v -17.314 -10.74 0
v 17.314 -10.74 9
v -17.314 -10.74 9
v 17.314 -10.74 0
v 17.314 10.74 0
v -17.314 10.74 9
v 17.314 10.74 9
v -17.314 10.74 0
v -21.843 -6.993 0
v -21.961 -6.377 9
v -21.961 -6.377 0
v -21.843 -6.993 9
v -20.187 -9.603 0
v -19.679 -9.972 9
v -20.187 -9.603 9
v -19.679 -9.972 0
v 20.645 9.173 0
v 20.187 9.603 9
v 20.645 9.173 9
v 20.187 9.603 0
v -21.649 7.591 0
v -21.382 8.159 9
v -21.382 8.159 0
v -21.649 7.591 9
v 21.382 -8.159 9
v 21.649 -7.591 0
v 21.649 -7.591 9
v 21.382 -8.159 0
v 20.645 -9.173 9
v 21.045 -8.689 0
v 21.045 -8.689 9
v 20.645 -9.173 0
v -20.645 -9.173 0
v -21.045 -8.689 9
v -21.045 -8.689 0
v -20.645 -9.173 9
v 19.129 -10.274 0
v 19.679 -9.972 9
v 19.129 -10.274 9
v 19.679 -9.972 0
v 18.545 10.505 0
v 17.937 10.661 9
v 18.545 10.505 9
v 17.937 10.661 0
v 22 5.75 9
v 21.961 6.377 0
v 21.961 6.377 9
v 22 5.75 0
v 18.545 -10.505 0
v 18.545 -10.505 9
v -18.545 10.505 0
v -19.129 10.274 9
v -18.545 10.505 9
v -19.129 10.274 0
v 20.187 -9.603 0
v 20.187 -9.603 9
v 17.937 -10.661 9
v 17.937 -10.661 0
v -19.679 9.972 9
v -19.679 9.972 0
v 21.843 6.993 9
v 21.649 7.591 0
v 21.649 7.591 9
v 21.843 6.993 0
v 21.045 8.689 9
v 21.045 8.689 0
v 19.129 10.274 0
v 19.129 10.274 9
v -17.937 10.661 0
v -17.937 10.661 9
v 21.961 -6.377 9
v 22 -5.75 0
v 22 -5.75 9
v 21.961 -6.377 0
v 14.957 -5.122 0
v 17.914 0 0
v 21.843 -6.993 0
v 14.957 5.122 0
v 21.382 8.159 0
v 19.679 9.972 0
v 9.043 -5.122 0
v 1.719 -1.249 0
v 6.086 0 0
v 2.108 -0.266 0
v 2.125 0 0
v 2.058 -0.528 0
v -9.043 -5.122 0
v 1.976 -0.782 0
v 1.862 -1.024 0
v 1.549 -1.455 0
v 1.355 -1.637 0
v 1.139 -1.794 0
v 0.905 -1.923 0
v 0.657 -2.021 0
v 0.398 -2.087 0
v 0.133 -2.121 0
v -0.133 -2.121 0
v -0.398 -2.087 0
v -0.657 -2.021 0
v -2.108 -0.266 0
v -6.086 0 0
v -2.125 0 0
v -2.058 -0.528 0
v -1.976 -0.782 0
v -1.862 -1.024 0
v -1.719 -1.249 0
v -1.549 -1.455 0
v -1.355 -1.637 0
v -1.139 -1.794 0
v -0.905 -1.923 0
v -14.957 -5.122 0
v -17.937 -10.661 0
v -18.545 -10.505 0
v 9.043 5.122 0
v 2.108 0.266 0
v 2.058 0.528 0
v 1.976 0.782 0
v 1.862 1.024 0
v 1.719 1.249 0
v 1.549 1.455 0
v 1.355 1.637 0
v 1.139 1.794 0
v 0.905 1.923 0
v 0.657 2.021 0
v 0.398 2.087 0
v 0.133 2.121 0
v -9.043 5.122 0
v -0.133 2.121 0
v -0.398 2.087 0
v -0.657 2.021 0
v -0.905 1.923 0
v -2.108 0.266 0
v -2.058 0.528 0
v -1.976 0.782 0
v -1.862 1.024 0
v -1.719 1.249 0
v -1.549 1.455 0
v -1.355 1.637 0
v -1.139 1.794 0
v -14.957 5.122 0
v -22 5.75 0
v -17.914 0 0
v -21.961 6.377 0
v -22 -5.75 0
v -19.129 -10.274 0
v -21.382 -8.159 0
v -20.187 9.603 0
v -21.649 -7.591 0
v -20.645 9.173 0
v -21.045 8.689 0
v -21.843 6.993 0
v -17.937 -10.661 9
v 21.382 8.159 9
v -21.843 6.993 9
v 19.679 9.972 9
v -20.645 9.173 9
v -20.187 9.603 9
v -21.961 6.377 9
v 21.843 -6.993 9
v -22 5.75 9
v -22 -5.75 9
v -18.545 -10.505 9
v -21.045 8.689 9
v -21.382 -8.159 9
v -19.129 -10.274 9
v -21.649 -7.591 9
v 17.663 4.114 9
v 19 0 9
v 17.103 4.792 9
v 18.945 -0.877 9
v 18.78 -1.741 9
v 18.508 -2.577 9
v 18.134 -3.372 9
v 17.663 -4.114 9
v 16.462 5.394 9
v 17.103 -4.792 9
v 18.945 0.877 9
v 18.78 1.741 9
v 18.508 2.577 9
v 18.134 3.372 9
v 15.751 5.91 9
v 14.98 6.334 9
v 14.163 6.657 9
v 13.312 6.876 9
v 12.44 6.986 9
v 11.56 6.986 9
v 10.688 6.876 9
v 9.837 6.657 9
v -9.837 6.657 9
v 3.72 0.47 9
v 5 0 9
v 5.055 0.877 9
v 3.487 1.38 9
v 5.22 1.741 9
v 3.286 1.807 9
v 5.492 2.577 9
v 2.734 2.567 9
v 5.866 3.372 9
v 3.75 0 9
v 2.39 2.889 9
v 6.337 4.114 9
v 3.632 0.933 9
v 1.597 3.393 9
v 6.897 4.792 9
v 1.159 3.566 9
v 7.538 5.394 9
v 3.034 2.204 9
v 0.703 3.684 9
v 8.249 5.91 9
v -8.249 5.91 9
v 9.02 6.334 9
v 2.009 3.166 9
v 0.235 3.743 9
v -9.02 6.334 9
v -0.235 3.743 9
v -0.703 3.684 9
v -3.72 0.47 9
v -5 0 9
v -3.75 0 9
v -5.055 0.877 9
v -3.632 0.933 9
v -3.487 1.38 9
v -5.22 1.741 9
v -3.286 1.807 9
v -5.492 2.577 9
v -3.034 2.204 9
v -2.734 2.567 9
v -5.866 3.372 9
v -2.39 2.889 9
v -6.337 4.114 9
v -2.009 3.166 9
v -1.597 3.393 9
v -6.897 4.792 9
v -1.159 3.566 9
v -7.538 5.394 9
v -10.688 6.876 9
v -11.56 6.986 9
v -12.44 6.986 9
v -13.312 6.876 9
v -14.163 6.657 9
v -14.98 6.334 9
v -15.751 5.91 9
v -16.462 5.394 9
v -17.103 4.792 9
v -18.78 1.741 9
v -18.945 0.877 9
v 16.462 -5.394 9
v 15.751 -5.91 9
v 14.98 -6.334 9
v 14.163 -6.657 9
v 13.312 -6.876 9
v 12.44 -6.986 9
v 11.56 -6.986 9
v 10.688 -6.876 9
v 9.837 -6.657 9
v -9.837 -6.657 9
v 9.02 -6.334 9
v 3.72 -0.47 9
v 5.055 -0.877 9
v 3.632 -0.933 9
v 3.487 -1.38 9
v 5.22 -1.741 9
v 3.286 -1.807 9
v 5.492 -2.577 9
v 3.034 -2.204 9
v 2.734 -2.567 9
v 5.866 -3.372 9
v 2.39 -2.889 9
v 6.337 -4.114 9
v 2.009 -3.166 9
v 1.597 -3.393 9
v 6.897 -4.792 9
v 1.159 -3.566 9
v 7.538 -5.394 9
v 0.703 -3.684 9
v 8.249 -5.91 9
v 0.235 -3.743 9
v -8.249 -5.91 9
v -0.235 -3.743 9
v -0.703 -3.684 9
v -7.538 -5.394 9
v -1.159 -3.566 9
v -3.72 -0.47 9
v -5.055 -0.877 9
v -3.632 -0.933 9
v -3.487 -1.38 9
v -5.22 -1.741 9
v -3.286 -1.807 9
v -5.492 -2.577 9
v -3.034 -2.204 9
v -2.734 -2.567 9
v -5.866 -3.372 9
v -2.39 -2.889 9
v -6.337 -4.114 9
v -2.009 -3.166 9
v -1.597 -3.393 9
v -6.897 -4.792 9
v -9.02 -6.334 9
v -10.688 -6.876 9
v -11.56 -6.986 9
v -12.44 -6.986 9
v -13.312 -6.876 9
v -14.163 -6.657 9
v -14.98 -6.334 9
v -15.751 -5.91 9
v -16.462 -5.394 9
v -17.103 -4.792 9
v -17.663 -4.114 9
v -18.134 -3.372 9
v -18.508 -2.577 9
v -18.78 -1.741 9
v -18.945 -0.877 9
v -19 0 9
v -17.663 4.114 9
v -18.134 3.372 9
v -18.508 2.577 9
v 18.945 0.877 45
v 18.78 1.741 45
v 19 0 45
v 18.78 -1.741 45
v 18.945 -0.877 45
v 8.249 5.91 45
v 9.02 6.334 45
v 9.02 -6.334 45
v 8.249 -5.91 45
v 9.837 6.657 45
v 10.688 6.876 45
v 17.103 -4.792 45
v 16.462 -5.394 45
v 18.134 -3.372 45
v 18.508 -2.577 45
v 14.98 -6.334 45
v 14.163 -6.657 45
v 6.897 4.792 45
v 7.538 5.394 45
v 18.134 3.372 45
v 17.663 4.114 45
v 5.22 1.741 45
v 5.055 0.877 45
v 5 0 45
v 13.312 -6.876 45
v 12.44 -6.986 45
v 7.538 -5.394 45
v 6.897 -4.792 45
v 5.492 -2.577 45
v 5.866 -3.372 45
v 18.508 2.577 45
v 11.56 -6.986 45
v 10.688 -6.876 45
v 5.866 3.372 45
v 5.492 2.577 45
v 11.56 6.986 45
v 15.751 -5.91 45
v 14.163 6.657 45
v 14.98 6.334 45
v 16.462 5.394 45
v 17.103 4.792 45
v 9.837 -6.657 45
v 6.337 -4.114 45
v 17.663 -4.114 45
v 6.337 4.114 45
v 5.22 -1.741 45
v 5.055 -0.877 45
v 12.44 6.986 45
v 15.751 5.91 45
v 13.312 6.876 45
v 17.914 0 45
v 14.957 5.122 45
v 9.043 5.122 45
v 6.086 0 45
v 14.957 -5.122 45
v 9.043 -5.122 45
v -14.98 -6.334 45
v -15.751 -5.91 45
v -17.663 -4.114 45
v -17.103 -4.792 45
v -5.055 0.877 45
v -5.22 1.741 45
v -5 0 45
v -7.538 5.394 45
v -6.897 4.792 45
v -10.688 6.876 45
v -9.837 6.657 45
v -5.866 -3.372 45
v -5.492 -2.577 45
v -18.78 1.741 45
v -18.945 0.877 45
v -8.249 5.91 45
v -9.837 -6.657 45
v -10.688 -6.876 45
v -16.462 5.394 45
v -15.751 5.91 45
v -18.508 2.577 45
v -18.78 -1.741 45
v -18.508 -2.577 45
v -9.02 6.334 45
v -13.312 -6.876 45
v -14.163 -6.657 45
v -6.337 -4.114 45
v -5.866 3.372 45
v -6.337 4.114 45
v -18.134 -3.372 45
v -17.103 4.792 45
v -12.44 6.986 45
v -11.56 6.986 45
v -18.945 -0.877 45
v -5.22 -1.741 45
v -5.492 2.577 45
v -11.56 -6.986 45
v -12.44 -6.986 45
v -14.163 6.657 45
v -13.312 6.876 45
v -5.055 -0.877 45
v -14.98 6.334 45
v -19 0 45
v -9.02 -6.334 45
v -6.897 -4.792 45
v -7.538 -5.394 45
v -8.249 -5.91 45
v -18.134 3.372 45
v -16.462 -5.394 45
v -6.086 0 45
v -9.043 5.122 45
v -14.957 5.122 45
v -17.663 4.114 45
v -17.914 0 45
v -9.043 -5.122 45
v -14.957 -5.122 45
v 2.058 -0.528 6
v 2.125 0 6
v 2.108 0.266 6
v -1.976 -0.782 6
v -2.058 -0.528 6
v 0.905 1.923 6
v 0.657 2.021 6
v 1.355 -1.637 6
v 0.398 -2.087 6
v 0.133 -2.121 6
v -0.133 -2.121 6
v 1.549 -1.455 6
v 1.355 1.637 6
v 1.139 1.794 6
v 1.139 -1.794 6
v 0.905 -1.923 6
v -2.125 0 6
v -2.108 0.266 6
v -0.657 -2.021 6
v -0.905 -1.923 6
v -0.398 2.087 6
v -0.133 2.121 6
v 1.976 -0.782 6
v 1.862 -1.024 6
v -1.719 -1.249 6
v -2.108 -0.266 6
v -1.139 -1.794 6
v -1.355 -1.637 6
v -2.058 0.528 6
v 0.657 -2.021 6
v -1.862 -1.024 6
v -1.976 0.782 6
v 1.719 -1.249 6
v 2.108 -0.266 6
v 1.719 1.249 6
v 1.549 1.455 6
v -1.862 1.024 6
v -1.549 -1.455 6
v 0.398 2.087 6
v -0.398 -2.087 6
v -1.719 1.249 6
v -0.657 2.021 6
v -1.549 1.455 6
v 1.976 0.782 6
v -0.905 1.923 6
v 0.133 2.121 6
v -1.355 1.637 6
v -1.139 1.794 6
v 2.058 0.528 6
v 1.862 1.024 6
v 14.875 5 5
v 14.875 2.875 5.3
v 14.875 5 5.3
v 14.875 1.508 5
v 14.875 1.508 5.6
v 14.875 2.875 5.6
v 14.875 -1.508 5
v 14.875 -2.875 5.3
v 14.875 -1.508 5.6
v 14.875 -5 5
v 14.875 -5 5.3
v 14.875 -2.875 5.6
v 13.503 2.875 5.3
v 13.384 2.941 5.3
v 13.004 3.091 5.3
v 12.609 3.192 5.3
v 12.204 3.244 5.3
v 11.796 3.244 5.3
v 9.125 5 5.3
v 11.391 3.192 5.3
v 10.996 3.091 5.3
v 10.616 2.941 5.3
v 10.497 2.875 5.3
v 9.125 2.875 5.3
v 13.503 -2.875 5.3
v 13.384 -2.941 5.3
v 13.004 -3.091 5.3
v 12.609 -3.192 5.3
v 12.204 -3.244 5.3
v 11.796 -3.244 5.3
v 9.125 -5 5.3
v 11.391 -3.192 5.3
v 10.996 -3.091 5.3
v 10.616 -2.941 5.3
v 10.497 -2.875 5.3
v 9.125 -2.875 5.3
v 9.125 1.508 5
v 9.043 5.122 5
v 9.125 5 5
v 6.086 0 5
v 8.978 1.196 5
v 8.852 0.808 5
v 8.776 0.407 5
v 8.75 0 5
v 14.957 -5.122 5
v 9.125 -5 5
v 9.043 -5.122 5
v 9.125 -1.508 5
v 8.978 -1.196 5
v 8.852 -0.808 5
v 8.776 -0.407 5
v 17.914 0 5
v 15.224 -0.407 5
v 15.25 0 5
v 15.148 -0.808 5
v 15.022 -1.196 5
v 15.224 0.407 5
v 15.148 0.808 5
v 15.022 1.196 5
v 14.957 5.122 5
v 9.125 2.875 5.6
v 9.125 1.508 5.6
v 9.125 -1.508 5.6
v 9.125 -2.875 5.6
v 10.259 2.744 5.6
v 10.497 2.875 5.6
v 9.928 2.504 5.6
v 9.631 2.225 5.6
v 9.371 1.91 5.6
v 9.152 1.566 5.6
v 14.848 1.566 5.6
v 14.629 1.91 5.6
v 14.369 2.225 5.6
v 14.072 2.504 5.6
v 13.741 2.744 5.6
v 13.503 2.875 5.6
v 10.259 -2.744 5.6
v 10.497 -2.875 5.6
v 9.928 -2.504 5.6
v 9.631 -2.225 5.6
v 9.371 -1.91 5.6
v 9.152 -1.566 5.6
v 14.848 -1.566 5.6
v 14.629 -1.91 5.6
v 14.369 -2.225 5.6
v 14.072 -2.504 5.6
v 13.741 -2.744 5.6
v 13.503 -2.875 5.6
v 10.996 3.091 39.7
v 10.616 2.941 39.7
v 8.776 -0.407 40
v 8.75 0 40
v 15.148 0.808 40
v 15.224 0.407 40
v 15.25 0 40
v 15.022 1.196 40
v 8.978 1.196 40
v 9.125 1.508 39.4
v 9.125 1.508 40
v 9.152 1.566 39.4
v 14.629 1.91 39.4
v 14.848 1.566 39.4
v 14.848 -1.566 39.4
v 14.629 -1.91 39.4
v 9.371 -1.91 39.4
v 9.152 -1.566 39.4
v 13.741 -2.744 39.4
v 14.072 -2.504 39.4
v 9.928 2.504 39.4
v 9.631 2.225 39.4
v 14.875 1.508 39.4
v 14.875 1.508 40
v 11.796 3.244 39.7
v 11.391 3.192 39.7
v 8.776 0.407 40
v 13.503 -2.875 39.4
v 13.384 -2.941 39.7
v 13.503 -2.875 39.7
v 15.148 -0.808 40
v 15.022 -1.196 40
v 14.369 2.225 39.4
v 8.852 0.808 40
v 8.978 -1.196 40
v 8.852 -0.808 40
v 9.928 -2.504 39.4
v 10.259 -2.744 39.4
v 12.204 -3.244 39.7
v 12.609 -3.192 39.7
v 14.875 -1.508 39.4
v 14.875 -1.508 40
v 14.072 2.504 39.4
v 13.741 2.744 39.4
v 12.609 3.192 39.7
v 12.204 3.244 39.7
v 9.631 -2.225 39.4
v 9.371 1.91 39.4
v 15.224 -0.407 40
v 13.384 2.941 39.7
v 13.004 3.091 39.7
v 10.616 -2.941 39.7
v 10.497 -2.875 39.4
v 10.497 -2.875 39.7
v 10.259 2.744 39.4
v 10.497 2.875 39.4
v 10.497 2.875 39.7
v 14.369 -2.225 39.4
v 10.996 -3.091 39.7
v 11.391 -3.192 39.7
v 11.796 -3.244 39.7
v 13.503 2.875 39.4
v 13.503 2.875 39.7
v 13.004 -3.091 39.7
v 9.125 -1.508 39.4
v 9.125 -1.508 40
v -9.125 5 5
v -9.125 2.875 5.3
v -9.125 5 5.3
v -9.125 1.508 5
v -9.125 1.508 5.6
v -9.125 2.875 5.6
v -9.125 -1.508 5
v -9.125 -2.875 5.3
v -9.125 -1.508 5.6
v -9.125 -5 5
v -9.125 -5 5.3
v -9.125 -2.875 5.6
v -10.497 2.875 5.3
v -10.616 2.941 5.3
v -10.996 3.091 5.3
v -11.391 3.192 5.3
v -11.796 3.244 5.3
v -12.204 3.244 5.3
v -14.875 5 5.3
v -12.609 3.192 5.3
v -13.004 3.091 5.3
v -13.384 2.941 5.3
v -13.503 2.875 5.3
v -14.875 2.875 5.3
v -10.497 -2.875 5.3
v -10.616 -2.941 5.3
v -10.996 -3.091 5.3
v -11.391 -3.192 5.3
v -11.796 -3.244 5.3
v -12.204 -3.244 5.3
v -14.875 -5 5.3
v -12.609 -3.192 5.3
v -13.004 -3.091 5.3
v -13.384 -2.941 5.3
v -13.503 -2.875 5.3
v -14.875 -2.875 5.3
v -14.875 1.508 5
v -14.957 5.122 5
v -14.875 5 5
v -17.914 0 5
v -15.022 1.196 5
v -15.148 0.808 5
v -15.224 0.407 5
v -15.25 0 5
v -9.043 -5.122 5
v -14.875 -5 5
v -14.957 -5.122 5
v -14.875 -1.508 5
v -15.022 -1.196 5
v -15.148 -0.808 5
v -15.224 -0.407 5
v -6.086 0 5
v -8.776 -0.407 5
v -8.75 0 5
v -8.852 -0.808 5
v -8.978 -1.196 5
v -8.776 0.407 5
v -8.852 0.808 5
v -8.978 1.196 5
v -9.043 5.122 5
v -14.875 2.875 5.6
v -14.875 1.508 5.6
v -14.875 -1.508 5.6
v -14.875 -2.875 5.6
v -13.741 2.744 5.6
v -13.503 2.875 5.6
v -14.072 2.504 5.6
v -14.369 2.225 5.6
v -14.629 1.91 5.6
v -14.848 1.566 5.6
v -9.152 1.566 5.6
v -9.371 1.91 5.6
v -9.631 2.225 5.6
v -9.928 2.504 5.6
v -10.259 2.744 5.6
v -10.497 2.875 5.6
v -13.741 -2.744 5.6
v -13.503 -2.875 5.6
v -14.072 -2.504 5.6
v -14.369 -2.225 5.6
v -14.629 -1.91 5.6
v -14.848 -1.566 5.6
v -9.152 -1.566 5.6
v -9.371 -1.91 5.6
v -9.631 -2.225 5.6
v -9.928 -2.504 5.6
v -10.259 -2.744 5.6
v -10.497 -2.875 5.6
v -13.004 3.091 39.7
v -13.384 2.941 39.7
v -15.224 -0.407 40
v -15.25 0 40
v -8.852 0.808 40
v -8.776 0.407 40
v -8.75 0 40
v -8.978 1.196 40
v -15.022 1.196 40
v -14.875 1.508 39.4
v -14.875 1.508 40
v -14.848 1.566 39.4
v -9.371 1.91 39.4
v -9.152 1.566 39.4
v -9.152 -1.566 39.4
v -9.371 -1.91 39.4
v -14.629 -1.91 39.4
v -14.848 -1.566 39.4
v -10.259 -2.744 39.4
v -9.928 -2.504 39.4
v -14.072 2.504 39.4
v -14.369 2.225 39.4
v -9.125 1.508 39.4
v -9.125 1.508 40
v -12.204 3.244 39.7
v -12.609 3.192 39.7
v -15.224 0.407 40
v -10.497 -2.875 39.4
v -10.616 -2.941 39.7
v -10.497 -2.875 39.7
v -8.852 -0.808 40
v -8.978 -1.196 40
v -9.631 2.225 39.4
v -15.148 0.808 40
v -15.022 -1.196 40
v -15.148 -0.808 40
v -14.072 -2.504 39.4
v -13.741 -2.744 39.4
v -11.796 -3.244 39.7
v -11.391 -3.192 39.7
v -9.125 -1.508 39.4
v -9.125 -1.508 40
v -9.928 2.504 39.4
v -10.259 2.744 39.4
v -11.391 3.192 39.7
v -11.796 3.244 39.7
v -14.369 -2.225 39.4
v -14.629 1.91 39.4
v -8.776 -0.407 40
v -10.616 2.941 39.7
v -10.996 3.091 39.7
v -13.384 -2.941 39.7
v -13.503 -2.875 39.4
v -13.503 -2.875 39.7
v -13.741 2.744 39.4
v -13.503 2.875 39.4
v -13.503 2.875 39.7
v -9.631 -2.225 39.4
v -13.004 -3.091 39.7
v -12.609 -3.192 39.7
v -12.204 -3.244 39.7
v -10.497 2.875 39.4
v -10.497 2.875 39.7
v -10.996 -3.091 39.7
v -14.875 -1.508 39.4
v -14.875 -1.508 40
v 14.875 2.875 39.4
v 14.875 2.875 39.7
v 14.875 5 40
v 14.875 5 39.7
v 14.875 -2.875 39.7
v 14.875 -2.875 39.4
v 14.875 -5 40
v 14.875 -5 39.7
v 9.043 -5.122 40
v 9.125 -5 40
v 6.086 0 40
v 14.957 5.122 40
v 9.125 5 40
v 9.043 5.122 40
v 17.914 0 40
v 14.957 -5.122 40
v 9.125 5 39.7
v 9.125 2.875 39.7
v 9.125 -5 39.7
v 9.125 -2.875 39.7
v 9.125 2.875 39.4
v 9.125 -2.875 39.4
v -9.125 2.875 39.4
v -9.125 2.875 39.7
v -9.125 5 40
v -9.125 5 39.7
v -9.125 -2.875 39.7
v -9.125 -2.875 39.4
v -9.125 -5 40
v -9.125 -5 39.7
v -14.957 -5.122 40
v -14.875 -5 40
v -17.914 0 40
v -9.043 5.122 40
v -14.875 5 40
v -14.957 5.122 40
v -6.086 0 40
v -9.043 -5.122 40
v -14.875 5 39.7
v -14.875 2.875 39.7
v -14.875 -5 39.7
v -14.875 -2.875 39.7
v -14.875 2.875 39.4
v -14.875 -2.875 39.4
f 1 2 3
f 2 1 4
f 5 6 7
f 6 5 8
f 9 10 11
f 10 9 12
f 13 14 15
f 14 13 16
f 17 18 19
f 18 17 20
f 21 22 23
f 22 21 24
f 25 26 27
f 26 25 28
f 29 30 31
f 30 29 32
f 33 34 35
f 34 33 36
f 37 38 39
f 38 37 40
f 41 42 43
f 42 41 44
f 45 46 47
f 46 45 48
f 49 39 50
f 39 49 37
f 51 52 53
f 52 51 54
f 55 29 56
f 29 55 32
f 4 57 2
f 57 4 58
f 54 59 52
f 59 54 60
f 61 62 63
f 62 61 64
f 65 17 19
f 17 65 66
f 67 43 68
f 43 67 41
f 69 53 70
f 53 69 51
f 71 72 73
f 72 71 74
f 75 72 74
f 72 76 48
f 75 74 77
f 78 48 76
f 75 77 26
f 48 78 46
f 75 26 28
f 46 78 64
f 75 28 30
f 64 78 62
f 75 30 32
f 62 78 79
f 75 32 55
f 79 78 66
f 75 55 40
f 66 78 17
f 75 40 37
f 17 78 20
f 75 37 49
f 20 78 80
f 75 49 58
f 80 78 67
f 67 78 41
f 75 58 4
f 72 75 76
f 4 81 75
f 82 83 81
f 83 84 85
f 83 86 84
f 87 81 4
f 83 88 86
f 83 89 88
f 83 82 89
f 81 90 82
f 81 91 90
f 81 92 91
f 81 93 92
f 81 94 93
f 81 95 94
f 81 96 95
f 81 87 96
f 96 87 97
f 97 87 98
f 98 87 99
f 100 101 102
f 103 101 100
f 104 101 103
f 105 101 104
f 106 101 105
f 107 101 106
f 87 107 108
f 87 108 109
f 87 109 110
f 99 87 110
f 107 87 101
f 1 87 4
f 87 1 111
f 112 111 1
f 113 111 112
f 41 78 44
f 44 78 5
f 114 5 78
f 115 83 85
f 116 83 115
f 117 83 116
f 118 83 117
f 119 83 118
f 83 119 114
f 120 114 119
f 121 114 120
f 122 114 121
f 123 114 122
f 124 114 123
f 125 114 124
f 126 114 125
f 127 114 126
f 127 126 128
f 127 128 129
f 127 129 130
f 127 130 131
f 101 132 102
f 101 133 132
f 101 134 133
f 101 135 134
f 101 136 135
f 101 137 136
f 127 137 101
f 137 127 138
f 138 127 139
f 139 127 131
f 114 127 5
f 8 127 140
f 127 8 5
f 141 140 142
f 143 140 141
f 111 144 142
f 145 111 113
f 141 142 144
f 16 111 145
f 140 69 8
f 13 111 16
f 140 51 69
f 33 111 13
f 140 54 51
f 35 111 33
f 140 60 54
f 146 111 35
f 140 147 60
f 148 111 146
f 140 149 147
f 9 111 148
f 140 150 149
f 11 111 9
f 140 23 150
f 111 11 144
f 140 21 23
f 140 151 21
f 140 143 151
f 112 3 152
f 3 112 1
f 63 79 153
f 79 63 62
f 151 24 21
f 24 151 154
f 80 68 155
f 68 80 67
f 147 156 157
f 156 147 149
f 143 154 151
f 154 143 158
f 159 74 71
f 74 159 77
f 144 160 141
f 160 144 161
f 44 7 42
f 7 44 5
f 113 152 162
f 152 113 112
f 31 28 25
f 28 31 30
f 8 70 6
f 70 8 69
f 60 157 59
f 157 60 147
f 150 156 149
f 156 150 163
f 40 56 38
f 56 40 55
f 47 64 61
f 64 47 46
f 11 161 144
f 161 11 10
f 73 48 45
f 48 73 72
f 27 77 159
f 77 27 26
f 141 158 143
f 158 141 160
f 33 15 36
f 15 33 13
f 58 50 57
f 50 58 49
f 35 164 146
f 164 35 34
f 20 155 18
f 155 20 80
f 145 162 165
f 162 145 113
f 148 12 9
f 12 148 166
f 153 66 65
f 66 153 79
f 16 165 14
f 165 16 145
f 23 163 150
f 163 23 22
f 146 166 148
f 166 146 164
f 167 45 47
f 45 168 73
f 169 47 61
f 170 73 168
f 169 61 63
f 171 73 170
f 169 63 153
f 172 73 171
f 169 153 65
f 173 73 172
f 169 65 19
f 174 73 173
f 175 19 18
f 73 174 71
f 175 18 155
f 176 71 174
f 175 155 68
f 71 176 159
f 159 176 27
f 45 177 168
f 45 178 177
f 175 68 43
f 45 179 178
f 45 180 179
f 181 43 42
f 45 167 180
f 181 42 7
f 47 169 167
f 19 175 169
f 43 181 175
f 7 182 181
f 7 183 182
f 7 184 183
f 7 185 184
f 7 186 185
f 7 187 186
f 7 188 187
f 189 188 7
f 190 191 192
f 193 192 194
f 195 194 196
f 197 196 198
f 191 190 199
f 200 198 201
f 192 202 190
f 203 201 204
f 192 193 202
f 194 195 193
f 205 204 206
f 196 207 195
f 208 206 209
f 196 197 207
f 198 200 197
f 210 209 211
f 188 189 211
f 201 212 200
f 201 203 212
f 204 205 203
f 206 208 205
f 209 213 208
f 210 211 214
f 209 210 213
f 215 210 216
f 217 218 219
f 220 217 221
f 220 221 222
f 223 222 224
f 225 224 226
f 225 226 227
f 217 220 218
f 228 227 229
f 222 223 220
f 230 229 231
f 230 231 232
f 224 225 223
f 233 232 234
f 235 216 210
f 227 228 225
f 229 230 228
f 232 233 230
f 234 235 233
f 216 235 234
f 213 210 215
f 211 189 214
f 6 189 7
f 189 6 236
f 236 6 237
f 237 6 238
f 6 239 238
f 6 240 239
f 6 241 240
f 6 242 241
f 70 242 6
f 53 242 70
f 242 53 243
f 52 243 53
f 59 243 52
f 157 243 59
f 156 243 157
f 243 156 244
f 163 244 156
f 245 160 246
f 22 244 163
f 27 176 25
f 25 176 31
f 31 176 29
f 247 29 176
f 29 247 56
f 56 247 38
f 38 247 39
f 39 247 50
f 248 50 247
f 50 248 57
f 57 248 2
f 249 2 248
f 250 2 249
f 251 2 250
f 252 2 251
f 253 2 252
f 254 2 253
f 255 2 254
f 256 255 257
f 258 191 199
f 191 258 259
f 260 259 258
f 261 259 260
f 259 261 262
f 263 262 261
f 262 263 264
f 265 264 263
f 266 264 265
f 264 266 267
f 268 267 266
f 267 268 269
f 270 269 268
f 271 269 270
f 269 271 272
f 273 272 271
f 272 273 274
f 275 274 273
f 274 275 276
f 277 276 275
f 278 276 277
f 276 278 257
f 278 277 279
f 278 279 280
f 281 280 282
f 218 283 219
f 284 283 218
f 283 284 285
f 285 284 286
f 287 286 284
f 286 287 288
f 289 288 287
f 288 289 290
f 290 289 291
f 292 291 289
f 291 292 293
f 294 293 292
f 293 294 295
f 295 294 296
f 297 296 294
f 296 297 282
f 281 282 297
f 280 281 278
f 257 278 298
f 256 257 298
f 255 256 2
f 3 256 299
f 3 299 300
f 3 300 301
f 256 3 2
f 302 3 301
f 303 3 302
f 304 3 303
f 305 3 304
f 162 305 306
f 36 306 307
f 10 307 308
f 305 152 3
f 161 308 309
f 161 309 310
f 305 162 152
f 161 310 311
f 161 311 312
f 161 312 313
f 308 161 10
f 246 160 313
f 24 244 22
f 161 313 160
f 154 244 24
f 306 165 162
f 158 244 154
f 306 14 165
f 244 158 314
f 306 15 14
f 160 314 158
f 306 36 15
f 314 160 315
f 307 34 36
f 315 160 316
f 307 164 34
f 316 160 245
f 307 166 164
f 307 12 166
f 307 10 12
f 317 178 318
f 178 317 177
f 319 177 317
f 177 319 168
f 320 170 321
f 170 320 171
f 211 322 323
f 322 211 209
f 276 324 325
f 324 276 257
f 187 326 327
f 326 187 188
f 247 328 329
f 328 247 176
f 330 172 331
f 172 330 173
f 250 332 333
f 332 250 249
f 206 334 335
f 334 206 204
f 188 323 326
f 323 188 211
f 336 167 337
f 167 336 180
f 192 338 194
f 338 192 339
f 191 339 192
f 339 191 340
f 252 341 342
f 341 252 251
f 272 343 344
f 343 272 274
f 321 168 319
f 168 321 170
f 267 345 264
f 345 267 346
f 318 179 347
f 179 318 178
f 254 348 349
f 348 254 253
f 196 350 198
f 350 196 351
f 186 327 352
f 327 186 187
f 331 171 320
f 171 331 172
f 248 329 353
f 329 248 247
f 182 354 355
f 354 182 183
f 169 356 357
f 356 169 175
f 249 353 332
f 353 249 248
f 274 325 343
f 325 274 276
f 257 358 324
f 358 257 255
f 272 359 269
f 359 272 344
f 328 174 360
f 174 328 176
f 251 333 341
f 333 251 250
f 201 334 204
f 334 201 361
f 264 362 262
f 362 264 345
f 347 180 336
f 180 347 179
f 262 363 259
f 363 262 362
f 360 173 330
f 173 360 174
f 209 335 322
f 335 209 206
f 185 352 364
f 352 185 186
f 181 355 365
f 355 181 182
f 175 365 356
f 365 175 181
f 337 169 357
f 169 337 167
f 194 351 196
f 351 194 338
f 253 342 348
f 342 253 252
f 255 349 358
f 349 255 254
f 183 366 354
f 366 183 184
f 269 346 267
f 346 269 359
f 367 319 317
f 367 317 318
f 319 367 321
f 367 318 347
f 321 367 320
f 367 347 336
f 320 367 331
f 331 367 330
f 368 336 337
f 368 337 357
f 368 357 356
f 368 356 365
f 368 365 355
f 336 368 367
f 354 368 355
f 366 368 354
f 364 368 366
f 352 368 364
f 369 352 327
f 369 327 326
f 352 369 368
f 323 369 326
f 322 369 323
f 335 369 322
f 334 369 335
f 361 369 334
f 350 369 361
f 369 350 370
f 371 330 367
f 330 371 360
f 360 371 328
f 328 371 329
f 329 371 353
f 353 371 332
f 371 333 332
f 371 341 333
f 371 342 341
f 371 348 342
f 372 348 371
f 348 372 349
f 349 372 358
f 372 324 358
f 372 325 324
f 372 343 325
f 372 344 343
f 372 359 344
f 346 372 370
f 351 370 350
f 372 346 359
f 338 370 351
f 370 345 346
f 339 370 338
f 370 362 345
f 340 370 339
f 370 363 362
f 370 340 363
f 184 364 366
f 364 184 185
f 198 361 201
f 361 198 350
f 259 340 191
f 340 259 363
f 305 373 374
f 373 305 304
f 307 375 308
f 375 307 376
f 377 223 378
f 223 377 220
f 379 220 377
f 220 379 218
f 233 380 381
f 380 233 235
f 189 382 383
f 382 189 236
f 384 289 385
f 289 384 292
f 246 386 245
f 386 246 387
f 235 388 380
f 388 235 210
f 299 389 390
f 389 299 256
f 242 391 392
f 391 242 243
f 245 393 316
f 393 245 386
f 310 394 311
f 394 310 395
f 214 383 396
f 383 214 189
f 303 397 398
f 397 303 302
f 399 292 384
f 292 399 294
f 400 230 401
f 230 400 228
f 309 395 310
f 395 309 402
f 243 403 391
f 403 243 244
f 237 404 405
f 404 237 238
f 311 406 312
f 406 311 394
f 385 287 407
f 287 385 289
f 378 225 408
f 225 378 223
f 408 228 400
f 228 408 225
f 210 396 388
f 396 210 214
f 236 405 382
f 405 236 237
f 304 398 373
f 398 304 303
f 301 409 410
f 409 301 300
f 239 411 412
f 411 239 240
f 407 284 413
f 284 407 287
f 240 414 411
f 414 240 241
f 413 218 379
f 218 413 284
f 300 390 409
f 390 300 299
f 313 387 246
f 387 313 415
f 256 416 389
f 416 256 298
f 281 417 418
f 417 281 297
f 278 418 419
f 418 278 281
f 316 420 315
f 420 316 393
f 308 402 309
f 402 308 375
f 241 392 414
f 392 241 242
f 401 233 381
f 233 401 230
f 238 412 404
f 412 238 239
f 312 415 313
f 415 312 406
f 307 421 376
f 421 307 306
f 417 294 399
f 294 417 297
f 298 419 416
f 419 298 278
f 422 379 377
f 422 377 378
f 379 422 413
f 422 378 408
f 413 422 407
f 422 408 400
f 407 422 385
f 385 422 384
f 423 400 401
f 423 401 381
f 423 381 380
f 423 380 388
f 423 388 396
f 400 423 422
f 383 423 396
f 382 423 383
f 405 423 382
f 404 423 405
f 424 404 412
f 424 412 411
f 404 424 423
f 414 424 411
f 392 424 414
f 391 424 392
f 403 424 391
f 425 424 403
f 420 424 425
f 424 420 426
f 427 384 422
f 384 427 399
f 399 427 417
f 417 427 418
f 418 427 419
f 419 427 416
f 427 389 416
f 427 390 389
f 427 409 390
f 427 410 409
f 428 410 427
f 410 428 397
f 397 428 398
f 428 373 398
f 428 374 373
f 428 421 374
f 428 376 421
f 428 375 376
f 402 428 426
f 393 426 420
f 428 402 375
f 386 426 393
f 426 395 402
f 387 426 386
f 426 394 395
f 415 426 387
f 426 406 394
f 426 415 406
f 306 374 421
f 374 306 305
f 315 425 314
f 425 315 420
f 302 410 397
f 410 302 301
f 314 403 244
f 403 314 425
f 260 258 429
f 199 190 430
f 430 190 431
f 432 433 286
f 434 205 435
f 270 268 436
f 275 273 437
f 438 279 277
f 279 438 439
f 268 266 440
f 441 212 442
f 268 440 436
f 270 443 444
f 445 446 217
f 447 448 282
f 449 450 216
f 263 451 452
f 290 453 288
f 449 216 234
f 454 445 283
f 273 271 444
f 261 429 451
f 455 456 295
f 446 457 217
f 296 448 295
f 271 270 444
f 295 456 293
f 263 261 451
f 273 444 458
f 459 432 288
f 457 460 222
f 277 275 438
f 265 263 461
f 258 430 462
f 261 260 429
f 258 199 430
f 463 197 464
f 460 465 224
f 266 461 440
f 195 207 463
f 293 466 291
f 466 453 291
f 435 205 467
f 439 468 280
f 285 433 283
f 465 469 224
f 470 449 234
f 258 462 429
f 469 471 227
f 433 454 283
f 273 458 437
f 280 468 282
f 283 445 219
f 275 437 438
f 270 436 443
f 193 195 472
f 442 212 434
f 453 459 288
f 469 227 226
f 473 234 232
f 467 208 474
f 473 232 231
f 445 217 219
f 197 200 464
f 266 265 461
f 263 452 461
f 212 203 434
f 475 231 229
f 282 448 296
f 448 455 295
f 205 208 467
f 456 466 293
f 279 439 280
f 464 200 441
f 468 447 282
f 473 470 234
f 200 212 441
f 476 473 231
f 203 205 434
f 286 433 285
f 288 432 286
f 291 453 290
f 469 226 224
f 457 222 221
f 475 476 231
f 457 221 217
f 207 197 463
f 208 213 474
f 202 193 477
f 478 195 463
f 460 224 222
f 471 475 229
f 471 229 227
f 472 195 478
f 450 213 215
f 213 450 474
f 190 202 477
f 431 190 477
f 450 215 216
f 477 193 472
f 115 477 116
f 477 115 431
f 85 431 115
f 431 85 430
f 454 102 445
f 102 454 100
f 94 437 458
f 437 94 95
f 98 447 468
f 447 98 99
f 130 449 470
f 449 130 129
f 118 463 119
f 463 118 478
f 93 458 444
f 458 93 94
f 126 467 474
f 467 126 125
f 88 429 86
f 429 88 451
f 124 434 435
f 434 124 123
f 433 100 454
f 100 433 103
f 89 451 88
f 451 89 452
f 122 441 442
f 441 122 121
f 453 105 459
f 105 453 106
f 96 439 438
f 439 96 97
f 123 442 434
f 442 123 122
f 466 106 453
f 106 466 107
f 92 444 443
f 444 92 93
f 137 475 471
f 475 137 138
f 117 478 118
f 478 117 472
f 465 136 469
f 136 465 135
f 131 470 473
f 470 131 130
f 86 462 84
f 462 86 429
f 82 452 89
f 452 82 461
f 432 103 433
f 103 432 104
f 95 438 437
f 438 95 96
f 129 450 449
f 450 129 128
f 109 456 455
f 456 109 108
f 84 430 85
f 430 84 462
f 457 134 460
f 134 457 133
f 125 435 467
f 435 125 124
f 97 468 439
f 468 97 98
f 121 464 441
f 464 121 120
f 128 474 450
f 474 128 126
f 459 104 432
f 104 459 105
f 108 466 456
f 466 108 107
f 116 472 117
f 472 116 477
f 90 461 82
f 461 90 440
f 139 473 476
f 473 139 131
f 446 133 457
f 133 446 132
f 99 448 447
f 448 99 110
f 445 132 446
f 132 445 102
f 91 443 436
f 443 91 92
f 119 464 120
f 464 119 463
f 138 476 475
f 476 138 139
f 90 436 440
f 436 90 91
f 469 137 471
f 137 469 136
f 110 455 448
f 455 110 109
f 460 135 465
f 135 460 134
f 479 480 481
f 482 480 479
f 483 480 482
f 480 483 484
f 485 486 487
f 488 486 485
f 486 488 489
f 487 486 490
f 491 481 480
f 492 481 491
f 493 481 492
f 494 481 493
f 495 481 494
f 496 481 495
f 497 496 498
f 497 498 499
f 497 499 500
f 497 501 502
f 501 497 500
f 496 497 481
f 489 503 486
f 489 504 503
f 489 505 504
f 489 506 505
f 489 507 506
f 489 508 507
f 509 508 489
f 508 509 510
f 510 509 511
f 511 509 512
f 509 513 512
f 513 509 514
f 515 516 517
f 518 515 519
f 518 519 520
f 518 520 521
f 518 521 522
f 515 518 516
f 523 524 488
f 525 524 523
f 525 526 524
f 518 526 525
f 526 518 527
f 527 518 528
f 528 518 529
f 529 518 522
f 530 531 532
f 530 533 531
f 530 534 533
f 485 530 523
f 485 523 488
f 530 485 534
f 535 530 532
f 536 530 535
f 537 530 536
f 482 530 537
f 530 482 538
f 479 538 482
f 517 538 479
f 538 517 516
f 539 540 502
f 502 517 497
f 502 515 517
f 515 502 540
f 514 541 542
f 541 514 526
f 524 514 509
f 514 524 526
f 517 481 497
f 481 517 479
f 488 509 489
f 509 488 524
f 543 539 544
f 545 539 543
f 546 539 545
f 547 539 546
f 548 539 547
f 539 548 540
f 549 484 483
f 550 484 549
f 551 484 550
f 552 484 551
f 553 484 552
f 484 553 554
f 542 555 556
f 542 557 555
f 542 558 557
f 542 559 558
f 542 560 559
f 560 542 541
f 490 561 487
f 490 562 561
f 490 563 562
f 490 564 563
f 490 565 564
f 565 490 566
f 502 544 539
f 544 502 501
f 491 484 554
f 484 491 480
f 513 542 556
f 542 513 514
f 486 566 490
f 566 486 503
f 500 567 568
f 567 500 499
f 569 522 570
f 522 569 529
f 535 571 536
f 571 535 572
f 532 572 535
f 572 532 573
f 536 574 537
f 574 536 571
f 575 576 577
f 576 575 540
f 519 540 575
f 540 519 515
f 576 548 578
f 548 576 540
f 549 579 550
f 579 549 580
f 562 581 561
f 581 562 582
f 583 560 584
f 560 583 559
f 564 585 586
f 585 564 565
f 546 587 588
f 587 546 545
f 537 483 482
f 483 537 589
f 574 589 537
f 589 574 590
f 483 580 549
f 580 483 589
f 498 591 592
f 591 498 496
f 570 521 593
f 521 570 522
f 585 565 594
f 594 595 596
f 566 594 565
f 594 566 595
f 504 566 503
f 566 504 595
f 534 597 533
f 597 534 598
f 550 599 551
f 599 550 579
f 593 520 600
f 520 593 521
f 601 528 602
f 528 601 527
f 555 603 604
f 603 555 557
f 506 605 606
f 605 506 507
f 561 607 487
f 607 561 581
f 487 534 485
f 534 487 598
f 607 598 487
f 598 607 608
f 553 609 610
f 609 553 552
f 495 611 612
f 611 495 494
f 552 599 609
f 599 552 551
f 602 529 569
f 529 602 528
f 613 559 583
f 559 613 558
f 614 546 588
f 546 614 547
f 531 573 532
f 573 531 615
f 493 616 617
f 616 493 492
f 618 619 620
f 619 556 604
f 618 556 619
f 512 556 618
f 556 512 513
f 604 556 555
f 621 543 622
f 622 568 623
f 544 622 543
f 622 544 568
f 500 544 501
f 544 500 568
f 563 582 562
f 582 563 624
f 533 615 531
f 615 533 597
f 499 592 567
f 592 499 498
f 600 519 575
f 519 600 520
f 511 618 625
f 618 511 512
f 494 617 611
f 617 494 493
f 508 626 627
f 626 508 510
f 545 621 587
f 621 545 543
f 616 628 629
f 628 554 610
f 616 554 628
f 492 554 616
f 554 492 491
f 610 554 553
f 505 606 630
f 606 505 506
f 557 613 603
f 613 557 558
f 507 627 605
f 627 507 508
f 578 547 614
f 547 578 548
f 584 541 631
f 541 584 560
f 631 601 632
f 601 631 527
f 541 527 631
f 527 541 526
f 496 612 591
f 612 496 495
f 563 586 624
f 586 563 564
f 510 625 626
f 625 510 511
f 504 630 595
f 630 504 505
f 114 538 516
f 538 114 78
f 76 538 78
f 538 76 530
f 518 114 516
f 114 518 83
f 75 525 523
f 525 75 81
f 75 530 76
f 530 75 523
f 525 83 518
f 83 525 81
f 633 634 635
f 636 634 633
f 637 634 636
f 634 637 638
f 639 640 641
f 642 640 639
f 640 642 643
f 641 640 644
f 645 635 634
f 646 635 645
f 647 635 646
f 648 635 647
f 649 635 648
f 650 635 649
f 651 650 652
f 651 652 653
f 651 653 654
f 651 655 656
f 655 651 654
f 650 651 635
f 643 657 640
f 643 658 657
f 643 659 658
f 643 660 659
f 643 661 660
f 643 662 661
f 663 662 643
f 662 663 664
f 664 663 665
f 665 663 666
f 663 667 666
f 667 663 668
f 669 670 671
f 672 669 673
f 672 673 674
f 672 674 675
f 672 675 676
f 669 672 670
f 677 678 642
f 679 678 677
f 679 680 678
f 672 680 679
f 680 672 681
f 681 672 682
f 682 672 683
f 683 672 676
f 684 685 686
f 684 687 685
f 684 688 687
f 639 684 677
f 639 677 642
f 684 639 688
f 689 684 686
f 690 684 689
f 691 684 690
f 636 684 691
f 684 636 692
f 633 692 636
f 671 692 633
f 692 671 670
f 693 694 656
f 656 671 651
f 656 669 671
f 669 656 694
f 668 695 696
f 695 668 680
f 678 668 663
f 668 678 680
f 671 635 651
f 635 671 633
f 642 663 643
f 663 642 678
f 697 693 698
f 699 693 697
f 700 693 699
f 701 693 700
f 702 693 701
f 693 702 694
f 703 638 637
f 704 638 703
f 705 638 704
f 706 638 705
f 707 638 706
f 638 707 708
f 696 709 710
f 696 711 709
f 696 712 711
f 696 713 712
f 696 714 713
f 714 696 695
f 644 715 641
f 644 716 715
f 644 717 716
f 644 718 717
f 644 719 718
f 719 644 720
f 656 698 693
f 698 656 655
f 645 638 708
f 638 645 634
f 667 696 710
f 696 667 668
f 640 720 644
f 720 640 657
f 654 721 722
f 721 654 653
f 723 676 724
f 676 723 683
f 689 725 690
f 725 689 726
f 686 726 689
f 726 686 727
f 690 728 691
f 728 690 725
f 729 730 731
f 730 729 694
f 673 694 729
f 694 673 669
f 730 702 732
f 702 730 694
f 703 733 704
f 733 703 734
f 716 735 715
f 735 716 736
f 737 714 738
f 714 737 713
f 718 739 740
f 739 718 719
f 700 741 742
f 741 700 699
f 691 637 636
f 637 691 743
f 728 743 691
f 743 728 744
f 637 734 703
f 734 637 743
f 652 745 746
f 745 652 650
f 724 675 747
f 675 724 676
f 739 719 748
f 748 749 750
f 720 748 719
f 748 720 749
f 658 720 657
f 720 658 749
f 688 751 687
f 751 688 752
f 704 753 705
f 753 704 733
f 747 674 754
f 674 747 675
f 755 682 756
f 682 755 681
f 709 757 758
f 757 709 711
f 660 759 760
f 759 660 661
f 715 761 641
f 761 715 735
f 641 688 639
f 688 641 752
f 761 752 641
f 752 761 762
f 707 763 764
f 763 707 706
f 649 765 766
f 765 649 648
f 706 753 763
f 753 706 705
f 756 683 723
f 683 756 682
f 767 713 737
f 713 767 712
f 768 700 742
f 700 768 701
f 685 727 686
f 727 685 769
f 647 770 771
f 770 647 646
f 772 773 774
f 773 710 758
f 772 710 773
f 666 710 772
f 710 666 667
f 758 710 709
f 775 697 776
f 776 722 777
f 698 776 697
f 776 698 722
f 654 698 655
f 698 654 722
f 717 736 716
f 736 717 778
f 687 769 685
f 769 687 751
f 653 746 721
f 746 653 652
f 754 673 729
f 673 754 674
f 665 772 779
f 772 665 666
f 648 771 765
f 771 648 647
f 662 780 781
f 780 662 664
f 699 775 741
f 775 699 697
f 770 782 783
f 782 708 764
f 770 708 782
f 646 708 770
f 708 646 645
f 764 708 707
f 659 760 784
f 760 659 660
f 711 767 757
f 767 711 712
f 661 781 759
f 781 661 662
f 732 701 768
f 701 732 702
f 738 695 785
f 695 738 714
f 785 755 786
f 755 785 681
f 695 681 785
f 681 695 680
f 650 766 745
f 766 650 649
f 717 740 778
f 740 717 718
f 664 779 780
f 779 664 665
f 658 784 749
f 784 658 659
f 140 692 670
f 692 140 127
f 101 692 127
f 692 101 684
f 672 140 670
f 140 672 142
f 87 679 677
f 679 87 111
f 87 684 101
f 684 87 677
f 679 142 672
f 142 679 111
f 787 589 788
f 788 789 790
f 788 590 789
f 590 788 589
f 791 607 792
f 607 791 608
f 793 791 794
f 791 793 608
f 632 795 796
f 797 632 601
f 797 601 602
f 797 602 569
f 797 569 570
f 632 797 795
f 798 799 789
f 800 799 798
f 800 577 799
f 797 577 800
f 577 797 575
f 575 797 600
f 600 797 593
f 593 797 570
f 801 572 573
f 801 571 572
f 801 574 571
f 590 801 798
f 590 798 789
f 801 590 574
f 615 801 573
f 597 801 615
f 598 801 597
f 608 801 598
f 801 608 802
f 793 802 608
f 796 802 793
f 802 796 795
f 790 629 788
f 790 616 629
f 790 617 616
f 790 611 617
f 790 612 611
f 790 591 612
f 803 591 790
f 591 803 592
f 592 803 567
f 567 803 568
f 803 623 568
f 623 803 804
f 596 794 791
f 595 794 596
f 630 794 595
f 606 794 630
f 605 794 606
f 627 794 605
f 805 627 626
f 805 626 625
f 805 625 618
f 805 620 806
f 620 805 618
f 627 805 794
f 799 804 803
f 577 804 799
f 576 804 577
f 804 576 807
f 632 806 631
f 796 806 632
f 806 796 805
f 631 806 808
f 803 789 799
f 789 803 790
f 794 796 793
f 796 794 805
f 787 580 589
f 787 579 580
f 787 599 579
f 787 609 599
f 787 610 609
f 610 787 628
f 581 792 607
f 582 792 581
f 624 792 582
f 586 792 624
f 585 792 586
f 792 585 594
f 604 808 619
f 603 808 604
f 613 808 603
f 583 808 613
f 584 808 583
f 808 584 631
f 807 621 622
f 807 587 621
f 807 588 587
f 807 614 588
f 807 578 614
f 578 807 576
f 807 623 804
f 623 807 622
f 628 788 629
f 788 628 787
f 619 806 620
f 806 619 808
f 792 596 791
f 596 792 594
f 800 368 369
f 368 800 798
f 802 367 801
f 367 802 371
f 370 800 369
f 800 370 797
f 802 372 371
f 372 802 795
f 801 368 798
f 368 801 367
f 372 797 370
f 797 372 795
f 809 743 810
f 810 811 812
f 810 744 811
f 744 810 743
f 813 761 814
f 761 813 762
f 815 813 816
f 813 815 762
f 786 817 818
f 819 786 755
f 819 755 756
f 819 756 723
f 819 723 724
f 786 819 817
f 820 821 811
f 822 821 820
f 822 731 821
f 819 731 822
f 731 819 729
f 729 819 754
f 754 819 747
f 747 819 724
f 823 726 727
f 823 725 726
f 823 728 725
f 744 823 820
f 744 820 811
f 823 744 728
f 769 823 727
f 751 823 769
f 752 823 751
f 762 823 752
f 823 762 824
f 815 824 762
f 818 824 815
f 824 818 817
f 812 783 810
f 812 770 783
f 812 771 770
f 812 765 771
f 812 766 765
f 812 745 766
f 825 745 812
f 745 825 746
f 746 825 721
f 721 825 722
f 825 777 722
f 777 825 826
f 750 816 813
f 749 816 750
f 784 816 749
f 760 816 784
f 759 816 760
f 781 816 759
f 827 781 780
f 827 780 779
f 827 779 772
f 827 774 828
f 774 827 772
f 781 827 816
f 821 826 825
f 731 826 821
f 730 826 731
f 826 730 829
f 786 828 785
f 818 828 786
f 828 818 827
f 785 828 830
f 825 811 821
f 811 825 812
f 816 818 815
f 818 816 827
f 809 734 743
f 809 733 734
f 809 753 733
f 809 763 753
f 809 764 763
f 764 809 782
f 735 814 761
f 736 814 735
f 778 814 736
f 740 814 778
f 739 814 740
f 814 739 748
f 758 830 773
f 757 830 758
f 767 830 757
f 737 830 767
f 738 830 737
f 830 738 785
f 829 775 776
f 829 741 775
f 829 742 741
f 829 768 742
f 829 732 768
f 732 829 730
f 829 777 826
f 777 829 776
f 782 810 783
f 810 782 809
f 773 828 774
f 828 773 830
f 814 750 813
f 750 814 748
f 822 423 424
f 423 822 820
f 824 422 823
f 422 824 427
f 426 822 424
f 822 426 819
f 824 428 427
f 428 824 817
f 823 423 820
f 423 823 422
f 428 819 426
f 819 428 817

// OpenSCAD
$fn = 50;


difference() {
	union() {
		hull() {
			translate(v = [-17.0000000000, 5.7500000000, 0]) {
				cylinder(h = 9, r = 5);
			}
			translate(v = [17.0000000000, 5.7500000000, 0]) {
				cylinder(h = 9, r = 5);
			}
			translate(v = [-17.0000000000, -5.7500000000, 0]) {
				cylinder(h = 9, r = 5);
			}
			translate(v = [17.0000000000, -5.7500000000, 0]) {
				cylinder(h = 9, r = 5);
			}
		}
		translate(v = [12.0000000000, 0, 0.0000000000]) {
			cylinder(h = 45, r = 7.0000000000);
		}
		translate(v = [-12.0000000000, 0, 0.0000000000]) {
			cylinder(h = 45, r = 7.0000000000);
		}
	}
	union() {
		translate(v = [0, 0, 9]) {
			rotate(a = [0, 0, 0]) {
				difference() {
					union() {
						#translate(v = [0, 0, -40.0000000000]) {
							cylinder(h = 40, r = 2.0000000000);
						}
						#translate(v = [0, 0, -3]) {
							cylinder(h = 3, r1 = 2.1250000000, r2 = 3.7500000000);
						}
						#translate(v = [0, 0, -40.0000000000]) {
							cylinder(h = 40, r = 2.1250000000);
						}
						#translate(v = [0, 0, -40.0000000000]) {
							cylinder(h = 40, r = 2.0000000000);
						}
					}
					union();
				}
			}
		}
		translate(v = [12.0000000000, 0, 0]) {
			rotate(a = [0, 0, 0]) {
				difference() {
					union() {
						#translate(v = [-2.8750000000, -5.0000000000, -0.3000000000]) {
							cube(size = [5.7500000000, 10, 0.3000000000]);
						}
						#translate(v = [-2.8750000000, -2.8750000000, -0.6000000000]) {
							cube(size = [5.7500000000, 5.7500000000, 0.3000000000]);
						}
						#translate(v = [-2.8750000000, -5.0000000000, 5]) {
							cube(size = [5.7500000000, 10, 0.3000000000]);
						}
						#translate(v = [-2.8750000000, -2.8750000000, 5.3000000000]) {
							cube(size = [5.7500000000, 5.7500000000, 0.3000000000]);
						}
						#translate(v = [0, 0, -100.0000000000]) {
							cylinder(h = 200, r = 3.2500000000);
						}
						#linear_extrude(height = 5) {
							polygon(points = [[5.9142500000, 0.0000000000], [2.9571250000, 5.1218907443], [-2.9571250000, 5.1218907443], [-5.9142500000, 0.0000000000], [-2.9571250000, -5.1218907443], [2.9571250000, -5.1218907443]]);
						}
						#translate(v = [-2.8750000000, -5.0000000000, -0.3000000000]) {
							cube(size = [5.7500000000, 10, 0.3000000000]);
						}
						#translate(v = [-2.8750000000, -2.8750000000, -0.6000000000]) {
							cube(size = [5.7500000000, 5.7500000000, 0.3000000000]);
						}
						#translate(v = [-2.8750000000, -5.0000000000, 5]) {
							cube(size = [5.7500000000, 10, 0.3000000000]);
						}
						#translate(v = [-2.8750000000, -2.8750000000, 5.3000000000]) {
							cube(size = [5.7500000000, 5.7500000000, 0.3000000000]);
						}
						#translate(v = [0, 0, -100.0000000000]) {
							cylinder(h = 200, r = 3.2500000000);
						}
						#translate(v = [-2.8750000000, -5.0000000000, -0.3000000000]) {
							cube(size = [5.7500000000, 10, 0.3000000000]);
						}
						#translate(v = [-2.8750000000, -2.8750000000, -0.6000000000]) {
							cube(size = [5.7500000000, 5.7500000000, 0.3000000000]);
						}
						#translate(v = [-2.8750000000, -5.0000000000, 5]) {
							cube(size = [5.7500000000, 10, 0.3000000000]);
						}
						#translate(v = [-2.8750000000, -2.8750000000, 5.3000000000]) {
							cube(size = [5.7500000000, 5.7500000000, 0.3000000000]);
						}
						#translate(v = [0, 0, -100.0000000000]) {
							cylinder(h = 200, r = 3.2500000000);
						}
					}
					union();
				}
			}
		}
		translate(v = [-12.0000000000, 0, 0]) {
			rotate(a = [0, 0, 0]) {
				difference() {
					union() {
						#translate(v = [-2.8750000000, -5.0000000000, -0.3000000000]) {
							cube(size = [5.7500000000, 10, 0.3000000000]);
						}
						#translate(v = [-2.8750000000, -2.8750000000, -0.6000000000]) {
							cube(size = [5.7500000000, 5.7500000000, 0.3000000000]);
						}
						#translate(v = [-2.8750000000, -5.0000000000, 5]) {
							cube(size = [5.7500000000, 10, 0.3000000000]);
						}
						#translate(v = [-2.8750000000, -2.8750000000, 5.3000000000]) {
							cube(size = [5.7500000000, 5.7500000000, 0.3000000000]);
						}
						#translate(v = [0, 0, -100.0000000000]) {
							cylinder(h = 200, r = 3.2500000000);
						}
						#linear_extrude(height = 5) {
							polygon(points = [[5.9142500000, 0.0000000000], [2.9571250000, 5.1218907443], [-2.9571250000, 5.1218907443], [-5.9142500000, 0.0000000000], [-2.9571250000, -5.1218907443], [2.9571250000, -5.1218907443]]);
						}
						#translate(v = [-2.8750000000, -5.0000000000, -0.3000000000]) {
							cube(size = [5.7500000000, 10, 0.3000000000]);
						}
						#translate(v = [-2.8750000000, -2.8750000000, -0.6000000000]) {
							cube(size = [5.7500000000, 5.7500000000, 0.3000000000]);
						}
						#translate(v = [-2.8750000000, -5.0000000000, 5]) {
							cube(size = [5.7500000000, 10, 0.3000000000]);
						}
						#translate(v = [-2.8750000000, -2.8750000000, 5.3000000000]) {
							cube(size = [5.7500000000, 5.7500000000, 0.3000000000]);
						}
						#translate(v = [0, 0, -100.0000000000]) {
							cylinder(h = 200, r = 3.2500000000);
						}
						#translate(v = [-2.8750000000, -5.0000000000, -0.3000000000]) {
							cube(size = [5.7500000000, 10, 0.3000000000]);
						}
						#translate(v = [-2.8750000000, -2.8750000000, -0.6000000000]) {
							cube(size = [5.7500000000, 5.7500000000, 0.3000000000]);
						}
						#translate(v = [-2.8750000000, -5.0000000000, 5]) {
							cube(size = [5.7500000000, 10, 0.3000000000]);
						}
						#translate(v = [-2.8750000000, -2.8750000000, 5.3000000000]) {
							cube(size = [5.7500000000, 5.7500000000, 0.3000000000]);
						}
						#translate(v = [0, 0, -100.0000000000]) {
							cylinder(h = 200, r = 3.2500000000);
						}
					}
					union();
				}
			}
		}
		translate(v = [12.0000000000, 0, 45]) {
			rotate(a = [0, 0, 0]) {
				difference() {
					union() {
						#translate(v = [-2.8750000000, -5.0000000000, -5.3000000000]) {
							cube(size = [5.7500000000, 10, 0.3000000000]);
						}
						#translate(v = [-2.8750000000, -2.8750000000, -5.6000000000]) {
							cube(size = [5.7500000000, 5.7500000000, 0.3000000000]);
						}
						#translate(v = [-2.8750000000, -5.0000000000, 0]) {
							cube(size = [5.7500000000, 10, 0.3000000000]);
						}
						#translate(v = [-2.8750000000, -2.8750000000, 0.3000000000]) {
							cube(size = [5.7500000000, 5.7500000000, 0.3000000000]);
						}
						#translate(v = [0, 0, -100.0000000000]) {
							cylinder(h = 200, r = 3.2500000000);
						}
						translate(v = [0, 0, -5]) {
							#linear_extrude(height = 5) {
								polygon(points = [[5.9142500000, 0.0000000000], [2.9571250000, 5.1218907443], [-2.9571250000, 5.1218907443], [-5.9142500000, 0.0000000000], [-2.9571250000, -5.1218907443], [2.9571250000, -5.1218907443]]);
							}
						}
						#translate(v = [-2.8750000000, -5.0000000000, -5.3000000000]) {
							cube(size = [5.7500000000, 10, 0.3000000000]);
						}
						#translate(v = [-2.8750000000, -2.8750000000, -5.6000000000]) {
							cube(size = [5.7500000000, 5.7500000000, 0.3000000000]);
						}
						#translate(v = [-2.8750000000, -5.0000000000, 0]) {
							cube(size = [5.7500000000, 10, 0.3000000000]);
						}
						#translate(v = [-2.8750000000, -2.8750000000, 0.3000000000]) {
							cube(size = [5.7500000000, 5.7500000000, 0.3000000000]);
						}
						#translate(v = [0, 0, -100.0000000000]) {
							cylinder(h = 200, r = 3.2500000000);
						}
						#translate(v = [-2.8750000000, -5.0000000000, -5.3000000000]) {
							cube(size = [5.7500000000, 10, 0.3000000000]);
						}
						#translate(v = [-2.8750000000, -2.8750000000, -5.6000000000]) {
							cube(size = [5.7500000000, 5.7500000000, 0.3000000000]);
						}
						#translate(v = [-2.8750000000, -5.0000000000, 0]) {
							cube(size = [5.7500000000, 10, 0.3000000000]);
						}
						#translate(v = [-2.8750000000, -2.8750000000, 0.3000000000]) {
							cube(size = [5.7500000000, 5.7500000000, 0.3000000000]);
						}
						#translate(v = [0, 0, -100.0000000000]) {
							cylinder(h = 200, r = 3.2500000000);
						}
					}
					union();
				}
			}
		}
		translate(v = [-12.0000000000, 0, 45]) {
			rotate(a = [0, 0, 0]) {
				difference() {
					union() {
						#translate(v = [-2.8750000000, -5.0000000000, -5.3000000000]) {
							cube(size = [5.7500000000, 10, 0.3000000000]);
						}
						#translate(v = [-2.8750000000, -2.8750000000, -5.6000000000]) {
							cube(size = [5.7500000000, 5.7500000000, 0.3000000000]);
						}
						#translate(v = [-2.8750000000, -5.0000000000, 0]) {
							cube(size = [5.7500000000, 10, 0.3000000000]);
						}
						#translate(v = [-2.8750000000, -2.8750000000, 0.3000000000]) {
							cube(size = [5.7500000000, 5.7500000000, 0.3000000000]);
						}
						#translate(v = [0, 0, -100.0000000000]) {
							cylinder(h = 200, r = 3.2500000000);
						}
						translate(v = [0, 0, -5]) {
							#linear_extrude(height = 5) {
								polygon(points = [[5.9142500000, 0.0000000000], [2.9571250000, 5.1218907443], [-2.9571250000, 5.1218907443], [-5.9142500000, 0.0000000000], [-2.9571250000, -5.1218907443], [2.9571250000, -5.1218907443]]);
							}
						}
						#translate(v = [-2.8750000000, -5.0000000000, -5.3000000000]) {
							cube(size = [5.7500000000, 10, 0.3000000000]);
						}
						#translate(v = [-2.8750000000, -2.8750000000, -5.6000000000]) {
							cube(size = [5.7500000000, 5.7500000000, 0.3000000000]);
						}
						#translate(v = [-2.8750000000, -5.0000000000, 0]) {
							cube(size = [5.7500000000, 10, 0.3000000000]);
						}
						#translate(v = [-2.8750000000, -2.8750000000, 0.3000000000]) {
							cube(size = [5.7500000000, 5.7500000000, 0.3000000000]);
						}
						#translate(v = [0, 0, -100.0000000000]) {
							cylinder(h = 200, r = 3.2500000000);
						}
						#translate(v = [-2.8750000000, -5.0000000000, -5.3000000000]) {
							cube(size = [5.7500000000, 10, 0.3000000000]);
						}
						#translate(v = [-2.8750000000, -2.8750000000, -5.6000000000]) {
							cube(size = [5.7500000000, 5.7500000000, 0.3000000000]);
						}
						#translate(v = [-2.8750000000, -5.0000000000, 0]) {
							cube(size = [5.7500000000, 10, 0.3000000000]);
						}
						#translate(v = [-2.8750000000, -2.8750000000, 0.3000000000]) {
							cube(size = [5.7500000000, 5.7500000000, 0.3000000000]);
						}
						#translate(v = [0, 0, -100.0000000000]) {
							cylinder(h = 200, r = 3.2500000000);
						}
					}
					union();
				}
			}
		}
	}
}
